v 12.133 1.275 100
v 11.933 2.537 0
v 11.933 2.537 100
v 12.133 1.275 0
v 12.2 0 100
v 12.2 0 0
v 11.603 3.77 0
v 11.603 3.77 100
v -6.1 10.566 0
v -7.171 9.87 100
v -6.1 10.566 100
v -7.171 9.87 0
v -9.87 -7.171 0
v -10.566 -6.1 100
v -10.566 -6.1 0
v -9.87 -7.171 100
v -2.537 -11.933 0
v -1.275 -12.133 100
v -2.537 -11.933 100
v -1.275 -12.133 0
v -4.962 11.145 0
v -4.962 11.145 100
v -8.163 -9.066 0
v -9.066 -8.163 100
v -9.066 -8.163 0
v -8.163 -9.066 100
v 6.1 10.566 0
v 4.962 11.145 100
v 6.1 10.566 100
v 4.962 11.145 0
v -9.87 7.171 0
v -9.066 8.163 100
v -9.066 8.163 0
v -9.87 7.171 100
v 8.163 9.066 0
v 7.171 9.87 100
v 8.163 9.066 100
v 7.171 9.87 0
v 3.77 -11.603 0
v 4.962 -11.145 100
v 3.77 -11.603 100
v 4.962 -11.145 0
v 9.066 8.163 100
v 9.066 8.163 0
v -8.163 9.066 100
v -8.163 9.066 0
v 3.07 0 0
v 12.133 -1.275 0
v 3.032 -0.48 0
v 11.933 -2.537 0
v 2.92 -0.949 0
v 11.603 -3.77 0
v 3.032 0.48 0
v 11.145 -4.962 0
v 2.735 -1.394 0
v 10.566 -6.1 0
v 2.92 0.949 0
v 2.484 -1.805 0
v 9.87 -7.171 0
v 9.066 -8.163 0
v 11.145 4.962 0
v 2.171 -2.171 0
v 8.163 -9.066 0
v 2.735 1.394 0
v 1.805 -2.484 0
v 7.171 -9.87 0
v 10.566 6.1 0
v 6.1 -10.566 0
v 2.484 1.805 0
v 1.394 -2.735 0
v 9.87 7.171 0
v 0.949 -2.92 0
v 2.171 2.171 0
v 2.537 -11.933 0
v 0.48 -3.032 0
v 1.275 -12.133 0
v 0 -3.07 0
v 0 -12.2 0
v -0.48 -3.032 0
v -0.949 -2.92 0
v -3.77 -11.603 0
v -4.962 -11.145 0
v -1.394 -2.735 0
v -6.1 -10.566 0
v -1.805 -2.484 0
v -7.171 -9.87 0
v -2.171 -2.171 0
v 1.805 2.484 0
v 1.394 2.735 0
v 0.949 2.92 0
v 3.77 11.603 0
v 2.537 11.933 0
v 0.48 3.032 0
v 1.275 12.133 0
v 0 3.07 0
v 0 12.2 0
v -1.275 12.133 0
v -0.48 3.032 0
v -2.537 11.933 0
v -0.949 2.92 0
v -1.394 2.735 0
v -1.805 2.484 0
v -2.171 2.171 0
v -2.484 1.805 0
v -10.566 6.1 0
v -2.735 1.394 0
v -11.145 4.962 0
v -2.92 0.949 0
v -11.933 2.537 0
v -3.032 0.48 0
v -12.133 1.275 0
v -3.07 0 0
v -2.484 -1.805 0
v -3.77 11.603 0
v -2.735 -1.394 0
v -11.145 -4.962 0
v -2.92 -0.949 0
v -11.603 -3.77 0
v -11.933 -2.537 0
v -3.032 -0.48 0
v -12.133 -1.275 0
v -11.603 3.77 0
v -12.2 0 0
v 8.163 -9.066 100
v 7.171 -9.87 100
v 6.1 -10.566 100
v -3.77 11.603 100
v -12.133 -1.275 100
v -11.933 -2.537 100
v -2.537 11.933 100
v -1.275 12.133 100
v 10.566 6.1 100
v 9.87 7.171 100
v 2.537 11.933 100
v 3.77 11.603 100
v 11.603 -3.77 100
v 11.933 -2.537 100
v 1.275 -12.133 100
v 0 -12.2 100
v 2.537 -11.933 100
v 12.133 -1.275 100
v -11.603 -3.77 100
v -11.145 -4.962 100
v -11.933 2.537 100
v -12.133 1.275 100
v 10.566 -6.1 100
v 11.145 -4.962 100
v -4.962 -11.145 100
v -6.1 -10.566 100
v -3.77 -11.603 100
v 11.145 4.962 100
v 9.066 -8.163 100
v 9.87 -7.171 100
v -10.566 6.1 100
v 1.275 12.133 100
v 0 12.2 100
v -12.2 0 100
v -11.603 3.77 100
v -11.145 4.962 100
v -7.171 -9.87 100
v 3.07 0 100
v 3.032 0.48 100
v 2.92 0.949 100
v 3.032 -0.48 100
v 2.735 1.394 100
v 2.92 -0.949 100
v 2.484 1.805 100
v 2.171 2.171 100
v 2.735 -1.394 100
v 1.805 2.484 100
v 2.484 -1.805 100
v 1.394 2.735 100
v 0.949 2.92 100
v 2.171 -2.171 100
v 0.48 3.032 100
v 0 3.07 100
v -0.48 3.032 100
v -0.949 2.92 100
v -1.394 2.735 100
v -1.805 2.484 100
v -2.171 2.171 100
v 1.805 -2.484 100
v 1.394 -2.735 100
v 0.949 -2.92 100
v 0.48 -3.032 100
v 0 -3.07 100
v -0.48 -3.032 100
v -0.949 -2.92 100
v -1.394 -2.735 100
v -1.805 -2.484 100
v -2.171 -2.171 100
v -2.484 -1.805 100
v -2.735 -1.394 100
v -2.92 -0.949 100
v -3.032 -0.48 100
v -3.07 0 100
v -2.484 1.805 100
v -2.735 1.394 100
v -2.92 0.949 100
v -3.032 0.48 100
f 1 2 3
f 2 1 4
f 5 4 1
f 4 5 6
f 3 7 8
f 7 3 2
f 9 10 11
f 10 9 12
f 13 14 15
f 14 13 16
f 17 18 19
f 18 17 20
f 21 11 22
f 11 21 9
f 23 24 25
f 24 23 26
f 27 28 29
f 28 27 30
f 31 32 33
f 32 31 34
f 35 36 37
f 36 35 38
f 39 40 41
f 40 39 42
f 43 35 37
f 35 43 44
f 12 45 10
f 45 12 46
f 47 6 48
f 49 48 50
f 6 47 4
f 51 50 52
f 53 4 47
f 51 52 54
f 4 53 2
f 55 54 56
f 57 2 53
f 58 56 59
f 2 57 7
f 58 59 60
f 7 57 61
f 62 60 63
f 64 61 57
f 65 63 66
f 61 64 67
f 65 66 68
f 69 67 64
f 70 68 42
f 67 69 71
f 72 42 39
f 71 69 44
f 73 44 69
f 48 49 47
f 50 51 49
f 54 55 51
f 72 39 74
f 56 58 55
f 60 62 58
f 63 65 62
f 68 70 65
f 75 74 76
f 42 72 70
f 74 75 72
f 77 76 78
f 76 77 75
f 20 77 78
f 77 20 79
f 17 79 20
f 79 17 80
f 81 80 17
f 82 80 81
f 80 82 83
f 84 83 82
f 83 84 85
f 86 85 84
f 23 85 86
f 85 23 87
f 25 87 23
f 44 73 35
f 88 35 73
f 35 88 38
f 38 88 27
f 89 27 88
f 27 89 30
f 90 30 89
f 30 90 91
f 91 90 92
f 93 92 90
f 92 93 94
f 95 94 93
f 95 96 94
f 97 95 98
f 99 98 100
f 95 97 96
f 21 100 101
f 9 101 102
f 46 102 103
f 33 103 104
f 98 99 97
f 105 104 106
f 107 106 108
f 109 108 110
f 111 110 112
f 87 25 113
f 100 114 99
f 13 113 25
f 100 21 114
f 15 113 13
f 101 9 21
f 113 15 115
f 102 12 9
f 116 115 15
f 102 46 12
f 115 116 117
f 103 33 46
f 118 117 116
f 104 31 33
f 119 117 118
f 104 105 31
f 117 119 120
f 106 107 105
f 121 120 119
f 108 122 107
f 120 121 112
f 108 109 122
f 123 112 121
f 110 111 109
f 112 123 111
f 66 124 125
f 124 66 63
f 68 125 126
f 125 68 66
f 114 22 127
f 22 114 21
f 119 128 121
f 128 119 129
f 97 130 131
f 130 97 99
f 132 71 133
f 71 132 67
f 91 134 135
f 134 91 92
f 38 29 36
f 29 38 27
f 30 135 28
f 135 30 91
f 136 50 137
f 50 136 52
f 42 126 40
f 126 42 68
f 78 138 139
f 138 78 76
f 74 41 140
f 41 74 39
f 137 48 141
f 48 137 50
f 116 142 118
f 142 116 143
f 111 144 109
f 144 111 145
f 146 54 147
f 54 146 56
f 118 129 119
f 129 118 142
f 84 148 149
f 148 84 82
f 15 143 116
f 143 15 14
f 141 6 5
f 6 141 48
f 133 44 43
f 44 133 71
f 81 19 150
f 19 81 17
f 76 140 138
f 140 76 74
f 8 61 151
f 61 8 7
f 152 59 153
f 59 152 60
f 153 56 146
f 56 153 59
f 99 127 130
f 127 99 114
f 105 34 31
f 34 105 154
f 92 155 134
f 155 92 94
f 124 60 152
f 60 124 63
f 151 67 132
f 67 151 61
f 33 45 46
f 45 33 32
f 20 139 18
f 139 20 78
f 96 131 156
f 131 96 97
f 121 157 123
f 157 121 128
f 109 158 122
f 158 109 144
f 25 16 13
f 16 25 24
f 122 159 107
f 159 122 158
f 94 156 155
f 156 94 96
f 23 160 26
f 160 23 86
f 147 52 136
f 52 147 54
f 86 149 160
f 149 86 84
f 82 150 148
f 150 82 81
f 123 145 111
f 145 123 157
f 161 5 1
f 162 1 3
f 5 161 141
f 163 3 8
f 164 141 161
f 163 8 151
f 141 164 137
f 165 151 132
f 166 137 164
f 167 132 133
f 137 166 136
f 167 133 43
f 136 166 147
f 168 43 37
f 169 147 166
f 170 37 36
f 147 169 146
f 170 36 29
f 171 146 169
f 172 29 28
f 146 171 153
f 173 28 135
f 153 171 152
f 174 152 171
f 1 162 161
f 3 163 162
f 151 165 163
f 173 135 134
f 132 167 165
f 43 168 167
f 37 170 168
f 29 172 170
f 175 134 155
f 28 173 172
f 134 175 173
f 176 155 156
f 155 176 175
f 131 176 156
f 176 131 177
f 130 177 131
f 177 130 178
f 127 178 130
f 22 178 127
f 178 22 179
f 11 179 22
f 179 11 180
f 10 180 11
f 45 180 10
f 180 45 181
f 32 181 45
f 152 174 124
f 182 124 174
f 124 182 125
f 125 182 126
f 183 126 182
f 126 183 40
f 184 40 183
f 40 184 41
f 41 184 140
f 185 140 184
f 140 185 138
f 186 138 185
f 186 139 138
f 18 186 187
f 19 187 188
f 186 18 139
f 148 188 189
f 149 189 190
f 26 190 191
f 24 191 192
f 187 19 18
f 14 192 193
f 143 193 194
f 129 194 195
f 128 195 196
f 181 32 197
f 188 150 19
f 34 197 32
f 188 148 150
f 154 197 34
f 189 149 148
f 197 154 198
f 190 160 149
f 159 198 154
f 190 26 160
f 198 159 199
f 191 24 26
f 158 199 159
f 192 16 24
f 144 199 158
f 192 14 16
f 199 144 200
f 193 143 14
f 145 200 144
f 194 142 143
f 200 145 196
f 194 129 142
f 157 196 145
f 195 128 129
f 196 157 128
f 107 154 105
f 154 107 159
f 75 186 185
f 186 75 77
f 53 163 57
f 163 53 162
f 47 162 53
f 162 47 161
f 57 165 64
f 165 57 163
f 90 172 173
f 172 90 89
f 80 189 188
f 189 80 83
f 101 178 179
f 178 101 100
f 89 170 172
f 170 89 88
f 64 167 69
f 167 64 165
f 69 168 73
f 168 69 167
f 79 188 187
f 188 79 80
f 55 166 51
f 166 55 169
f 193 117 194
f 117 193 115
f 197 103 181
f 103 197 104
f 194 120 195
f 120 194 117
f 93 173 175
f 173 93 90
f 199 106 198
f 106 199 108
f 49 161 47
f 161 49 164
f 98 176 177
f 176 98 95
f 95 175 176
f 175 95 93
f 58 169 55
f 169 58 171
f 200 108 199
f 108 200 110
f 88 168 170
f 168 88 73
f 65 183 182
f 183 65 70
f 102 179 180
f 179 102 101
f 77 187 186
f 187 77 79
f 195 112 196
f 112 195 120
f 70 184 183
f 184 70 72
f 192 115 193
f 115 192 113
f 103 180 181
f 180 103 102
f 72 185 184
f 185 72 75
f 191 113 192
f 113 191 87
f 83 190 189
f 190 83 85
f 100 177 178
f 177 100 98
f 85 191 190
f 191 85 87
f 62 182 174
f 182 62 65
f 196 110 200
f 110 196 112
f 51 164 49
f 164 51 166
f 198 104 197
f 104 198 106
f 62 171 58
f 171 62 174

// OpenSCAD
        wall_thickness = 3.07;
        bore_clearance = 1.07;
        roller_radius = 12.2;

        module roller() {
            difference() {
                cylinder(h=100, r=roller_radius, $fn=60);
                translate([0,0,-5])
                    cylinder(h=110, r=bore_clearance + 2, $fn=40);
            }
        }
        roller();
        
